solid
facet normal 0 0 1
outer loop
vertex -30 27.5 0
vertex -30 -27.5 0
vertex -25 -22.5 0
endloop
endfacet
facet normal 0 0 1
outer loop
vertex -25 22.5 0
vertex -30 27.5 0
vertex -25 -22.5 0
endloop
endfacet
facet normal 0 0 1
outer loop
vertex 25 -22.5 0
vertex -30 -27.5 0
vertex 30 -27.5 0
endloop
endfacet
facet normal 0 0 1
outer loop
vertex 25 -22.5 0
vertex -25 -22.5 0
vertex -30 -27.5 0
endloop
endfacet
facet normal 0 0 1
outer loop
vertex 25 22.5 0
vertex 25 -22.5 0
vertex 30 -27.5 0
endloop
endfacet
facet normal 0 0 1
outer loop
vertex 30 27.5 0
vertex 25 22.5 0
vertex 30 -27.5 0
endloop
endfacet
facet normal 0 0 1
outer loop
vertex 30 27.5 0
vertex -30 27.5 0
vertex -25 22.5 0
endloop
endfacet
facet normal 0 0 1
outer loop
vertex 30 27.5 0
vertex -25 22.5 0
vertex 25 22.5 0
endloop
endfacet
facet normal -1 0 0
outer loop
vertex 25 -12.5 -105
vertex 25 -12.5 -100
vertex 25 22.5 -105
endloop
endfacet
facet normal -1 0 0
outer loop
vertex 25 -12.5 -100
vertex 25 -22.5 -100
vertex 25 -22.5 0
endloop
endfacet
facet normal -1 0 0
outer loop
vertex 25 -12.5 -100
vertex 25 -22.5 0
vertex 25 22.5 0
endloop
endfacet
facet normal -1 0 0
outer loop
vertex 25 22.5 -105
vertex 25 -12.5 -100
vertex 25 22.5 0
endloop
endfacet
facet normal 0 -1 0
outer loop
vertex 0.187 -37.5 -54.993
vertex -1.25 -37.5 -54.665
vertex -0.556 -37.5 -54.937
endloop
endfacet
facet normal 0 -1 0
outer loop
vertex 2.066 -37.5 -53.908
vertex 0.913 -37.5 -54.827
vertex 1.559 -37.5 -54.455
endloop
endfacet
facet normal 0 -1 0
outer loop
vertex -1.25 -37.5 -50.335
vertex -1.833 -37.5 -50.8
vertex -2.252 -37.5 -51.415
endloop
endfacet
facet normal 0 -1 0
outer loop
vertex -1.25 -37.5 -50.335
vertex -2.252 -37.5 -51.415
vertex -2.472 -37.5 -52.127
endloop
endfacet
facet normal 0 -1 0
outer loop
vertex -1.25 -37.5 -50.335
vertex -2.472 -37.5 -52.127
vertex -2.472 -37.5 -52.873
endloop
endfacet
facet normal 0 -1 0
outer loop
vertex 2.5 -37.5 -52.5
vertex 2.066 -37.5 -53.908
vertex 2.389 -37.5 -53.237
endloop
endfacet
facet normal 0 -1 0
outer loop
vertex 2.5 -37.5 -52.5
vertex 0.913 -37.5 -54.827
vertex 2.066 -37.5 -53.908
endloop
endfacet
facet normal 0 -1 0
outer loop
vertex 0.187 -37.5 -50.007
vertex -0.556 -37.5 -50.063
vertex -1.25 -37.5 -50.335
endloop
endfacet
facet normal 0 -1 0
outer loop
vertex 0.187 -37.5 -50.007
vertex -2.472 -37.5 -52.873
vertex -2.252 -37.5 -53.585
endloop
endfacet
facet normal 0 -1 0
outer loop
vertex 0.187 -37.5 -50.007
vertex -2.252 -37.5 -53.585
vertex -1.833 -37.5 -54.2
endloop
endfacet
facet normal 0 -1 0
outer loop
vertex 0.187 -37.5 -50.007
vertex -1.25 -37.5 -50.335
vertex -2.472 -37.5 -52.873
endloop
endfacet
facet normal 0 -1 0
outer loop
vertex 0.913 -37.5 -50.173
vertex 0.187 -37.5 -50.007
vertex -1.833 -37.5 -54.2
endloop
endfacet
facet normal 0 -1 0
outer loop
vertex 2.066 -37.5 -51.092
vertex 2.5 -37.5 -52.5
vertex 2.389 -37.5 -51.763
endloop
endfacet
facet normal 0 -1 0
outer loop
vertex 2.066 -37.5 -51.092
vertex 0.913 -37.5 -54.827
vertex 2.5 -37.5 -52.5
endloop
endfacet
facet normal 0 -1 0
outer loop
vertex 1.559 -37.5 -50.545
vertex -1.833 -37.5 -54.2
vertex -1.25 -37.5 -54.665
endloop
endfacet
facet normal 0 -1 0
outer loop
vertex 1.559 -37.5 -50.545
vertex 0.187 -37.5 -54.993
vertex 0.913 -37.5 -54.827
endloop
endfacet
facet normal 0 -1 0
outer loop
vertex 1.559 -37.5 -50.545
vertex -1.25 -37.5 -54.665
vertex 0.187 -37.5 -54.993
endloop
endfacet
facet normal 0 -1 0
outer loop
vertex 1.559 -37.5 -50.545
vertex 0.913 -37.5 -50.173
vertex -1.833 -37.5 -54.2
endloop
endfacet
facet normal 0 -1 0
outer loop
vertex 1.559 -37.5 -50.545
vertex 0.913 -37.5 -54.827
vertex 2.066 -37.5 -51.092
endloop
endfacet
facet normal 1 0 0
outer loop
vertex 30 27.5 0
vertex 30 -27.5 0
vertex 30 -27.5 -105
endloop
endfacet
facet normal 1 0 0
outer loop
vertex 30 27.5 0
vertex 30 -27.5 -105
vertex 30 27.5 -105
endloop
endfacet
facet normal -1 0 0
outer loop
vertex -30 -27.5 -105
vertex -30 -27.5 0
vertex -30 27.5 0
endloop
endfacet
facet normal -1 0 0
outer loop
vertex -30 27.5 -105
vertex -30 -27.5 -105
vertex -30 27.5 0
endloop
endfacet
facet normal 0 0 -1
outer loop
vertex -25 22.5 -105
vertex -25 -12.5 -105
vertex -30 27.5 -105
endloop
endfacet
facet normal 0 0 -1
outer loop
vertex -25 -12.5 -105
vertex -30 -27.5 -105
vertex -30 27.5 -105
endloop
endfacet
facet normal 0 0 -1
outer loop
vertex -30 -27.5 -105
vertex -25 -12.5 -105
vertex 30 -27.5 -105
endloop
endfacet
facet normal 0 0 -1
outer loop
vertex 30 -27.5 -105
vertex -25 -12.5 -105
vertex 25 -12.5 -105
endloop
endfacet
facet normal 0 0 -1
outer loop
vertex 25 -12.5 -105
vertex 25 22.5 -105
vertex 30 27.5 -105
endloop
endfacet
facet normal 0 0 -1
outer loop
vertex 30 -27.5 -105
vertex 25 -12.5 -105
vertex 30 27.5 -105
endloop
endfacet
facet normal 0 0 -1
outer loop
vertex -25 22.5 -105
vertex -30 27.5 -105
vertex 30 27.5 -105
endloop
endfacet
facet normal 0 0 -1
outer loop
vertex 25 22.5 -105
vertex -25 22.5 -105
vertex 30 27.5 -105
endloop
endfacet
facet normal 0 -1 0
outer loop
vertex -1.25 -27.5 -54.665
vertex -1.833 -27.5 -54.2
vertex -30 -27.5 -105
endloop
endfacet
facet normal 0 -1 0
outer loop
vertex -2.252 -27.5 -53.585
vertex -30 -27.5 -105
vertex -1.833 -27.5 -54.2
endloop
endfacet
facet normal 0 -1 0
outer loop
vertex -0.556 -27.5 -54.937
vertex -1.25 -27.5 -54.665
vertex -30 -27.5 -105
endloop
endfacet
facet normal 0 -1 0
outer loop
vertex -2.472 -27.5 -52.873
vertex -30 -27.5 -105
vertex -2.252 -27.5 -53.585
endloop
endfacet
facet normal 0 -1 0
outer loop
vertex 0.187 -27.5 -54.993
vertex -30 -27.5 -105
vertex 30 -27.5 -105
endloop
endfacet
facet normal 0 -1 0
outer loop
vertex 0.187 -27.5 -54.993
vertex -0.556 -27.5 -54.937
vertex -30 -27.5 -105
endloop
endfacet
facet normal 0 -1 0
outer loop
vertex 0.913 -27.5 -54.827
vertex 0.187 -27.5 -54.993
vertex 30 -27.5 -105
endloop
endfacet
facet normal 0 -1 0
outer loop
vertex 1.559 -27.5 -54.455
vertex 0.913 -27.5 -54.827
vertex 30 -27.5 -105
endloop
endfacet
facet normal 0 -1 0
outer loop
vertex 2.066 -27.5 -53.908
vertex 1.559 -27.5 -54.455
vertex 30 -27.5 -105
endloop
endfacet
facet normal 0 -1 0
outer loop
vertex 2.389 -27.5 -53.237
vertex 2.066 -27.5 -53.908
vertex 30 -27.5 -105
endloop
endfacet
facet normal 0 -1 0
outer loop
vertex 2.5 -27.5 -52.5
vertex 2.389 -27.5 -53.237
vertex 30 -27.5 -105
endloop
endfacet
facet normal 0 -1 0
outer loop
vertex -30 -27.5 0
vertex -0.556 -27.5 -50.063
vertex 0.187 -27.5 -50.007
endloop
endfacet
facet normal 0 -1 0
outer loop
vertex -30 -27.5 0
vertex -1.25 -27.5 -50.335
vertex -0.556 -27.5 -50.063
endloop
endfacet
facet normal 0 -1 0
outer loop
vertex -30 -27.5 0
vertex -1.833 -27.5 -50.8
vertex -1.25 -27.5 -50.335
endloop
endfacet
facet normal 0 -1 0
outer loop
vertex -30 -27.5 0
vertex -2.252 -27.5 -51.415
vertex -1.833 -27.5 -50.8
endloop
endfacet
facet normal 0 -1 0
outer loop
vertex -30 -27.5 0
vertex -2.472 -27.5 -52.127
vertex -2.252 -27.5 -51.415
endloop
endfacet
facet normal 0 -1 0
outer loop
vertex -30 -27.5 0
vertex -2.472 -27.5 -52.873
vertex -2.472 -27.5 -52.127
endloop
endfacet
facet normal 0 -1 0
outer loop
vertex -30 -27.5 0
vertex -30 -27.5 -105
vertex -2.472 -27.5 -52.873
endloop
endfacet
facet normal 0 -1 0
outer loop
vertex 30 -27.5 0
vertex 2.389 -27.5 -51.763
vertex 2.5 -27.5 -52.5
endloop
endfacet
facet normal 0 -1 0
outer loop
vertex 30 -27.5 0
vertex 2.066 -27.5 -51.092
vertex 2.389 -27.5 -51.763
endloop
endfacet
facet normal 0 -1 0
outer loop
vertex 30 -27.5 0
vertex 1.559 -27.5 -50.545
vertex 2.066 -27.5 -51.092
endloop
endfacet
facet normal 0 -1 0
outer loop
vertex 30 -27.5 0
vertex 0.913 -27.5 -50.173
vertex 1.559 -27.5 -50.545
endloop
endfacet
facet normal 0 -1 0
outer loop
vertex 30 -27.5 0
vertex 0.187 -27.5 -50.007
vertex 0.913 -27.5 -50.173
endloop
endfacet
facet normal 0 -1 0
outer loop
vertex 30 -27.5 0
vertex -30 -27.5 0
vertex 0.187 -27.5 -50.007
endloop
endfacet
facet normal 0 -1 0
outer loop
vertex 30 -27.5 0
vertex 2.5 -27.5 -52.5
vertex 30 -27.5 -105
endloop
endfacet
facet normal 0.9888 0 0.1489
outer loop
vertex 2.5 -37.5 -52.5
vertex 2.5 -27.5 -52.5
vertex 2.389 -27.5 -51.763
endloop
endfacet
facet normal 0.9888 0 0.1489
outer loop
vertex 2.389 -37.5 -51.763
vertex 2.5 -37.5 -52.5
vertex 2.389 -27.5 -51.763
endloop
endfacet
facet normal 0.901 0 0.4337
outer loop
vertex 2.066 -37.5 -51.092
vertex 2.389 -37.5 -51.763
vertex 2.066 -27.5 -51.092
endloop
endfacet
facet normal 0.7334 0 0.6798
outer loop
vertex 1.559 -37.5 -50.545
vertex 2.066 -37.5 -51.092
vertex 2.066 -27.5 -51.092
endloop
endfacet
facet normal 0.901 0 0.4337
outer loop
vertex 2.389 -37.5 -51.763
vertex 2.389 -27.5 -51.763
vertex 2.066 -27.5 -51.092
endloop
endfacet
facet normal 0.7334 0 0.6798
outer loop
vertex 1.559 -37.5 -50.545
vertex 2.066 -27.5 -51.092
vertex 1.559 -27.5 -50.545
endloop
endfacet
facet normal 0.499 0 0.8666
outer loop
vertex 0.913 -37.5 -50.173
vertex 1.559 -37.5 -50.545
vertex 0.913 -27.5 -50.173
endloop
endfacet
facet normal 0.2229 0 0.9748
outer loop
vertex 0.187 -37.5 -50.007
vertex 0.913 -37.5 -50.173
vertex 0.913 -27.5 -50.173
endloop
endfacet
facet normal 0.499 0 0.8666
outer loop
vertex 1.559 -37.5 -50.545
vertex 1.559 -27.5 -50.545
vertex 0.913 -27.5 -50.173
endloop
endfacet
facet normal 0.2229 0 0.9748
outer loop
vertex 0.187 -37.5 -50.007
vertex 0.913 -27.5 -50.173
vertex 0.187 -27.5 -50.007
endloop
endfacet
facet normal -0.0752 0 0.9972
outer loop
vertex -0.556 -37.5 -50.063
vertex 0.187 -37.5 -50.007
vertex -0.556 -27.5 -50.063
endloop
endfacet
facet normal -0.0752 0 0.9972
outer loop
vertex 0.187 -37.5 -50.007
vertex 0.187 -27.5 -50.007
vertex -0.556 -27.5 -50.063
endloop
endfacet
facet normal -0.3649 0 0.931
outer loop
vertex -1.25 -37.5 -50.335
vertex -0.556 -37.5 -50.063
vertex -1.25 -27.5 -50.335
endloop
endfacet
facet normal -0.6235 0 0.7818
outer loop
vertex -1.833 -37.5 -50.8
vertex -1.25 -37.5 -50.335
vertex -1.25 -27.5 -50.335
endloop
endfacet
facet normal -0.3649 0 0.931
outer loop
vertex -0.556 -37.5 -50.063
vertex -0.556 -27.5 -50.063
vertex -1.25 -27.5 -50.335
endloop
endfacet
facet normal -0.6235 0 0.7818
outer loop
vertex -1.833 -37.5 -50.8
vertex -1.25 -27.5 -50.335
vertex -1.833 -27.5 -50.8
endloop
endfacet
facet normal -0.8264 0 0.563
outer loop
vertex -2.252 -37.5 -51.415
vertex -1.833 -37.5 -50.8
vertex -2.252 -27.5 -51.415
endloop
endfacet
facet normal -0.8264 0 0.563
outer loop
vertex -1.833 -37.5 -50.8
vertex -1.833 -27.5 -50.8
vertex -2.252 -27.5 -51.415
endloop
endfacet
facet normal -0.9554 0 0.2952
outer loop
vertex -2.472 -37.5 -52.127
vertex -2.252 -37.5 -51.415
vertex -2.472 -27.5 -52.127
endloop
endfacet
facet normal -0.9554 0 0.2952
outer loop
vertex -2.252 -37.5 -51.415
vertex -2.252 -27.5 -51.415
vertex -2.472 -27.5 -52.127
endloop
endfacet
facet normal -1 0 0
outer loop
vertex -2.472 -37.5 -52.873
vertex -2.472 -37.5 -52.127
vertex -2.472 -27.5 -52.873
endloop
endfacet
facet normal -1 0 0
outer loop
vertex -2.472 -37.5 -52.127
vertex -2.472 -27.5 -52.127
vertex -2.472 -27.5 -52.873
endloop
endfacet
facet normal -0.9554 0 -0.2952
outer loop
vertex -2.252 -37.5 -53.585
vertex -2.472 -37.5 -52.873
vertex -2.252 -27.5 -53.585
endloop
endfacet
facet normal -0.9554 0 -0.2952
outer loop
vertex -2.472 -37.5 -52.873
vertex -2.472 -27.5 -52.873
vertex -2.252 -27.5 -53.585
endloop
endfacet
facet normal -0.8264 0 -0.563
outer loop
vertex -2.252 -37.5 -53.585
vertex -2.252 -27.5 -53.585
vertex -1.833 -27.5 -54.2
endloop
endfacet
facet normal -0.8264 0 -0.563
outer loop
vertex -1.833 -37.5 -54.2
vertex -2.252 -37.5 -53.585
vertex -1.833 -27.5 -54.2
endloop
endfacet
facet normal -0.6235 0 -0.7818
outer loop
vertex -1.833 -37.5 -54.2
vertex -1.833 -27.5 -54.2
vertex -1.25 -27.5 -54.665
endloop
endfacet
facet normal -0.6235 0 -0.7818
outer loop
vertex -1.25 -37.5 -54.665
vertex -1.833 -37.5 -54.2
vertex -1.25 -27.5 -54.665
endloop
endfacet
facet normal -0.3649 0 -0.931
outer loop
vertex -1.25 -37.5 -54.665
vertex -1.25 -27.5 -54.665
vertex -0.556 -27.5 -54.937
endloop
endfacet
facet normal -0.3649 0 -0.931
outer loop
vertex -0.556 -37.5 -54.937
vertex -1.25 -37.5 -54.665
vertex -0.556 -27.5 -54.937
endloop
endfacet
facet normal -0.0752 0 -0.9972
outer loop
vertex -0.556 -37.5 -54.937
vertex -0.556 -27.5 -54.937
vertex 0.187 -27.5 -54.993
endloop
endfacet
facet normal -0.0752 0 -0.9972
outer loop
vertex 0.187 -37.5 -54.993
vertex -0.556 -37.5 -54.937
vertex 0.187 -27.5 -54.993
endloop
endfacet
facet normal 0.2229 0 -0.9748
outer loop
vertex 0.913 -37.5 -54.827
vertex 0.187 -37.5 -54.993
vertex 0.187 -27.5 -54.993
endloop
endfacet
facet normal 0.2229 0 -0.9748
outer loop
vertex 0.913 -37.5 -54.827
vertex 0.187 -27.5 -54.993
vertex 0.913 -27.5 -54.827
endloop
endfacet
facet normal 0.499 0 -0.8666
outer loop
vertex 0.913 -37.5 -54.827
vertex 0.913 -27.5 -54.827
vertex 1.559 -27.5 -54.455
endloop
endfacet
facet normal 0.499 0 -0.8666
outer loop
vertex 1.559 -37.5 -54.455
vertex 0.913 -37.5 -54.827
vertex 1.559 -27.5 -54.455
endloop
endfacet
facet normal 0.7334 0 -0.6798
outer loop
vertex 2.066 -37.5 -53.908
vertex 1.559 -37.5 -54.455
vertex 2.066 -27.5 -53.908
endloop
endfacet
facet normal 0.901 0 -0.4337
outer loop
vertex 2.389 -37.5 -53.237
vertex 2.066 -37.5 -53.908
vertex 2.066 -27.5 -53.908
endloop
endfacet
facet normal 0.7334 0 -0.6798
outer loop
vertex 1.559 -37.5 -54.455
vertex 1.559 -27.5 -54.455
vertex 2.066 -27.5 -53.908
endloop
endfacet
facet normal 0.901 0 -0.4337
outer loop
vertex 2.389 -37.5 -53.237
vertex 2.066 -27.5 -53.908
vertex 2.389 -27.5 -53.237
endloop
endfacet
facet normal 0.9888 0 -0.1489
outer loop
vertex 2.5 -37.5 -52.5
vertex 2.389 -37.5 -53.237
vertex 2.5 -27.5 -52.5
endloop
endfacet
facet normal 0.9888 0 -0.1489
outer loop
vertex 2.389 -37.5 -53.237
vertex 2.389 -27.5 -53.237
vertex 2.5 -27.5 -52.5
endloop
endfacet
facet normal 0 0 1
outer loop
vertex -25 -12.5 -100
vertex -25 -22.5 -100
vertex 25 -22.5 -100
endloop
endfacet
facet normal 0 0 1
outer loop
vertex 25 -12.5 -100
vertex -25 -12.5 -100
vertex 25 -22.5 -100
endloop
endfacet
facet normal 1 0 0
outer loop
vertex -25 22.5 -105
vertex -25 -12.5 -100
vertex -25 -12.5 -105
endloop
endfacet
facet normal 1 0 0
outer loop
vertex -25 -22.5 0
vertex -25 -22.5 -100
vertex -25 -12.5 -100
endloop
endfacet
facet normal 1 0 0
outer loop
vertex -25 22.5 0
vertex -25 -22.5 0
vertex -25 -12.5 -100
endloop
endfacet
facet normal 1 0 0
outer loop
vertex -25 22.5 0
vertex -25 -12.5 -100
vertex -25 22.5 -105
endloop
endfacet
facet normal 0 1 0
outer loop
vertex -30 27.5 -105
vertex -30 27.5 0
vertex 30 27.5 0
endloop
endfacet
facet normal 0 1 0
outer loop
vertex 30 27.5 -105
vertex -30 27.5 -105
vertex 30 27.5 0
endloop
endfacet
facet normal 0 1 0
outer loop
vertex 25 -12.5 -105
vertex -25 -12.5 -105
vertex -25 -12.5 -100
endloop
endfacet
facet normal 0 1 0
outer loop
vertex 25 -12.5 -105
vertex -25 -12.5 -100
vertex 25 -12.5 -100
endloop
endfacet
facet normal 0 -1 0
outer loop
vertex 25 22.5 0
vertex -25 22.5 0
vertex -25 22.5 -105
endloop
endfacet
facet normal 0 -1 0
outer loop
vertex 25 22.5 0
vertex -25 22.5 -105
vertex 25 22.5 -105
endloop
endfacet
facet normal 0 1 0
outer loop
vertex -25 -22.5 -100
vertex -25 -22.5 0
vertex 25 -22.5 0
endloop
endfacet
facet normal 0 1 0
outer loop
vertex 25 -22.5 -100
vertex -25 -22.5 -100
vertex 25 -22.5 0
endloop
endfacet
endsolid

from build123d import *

# Parameters (mm, degrees)
SKETCH3_W           = 60
SKETCH3_H           = 55
SKETCH3_W_2         = 50
SKETCH3_H_2         = 45
BOSS_EXTRUDE1_DEPTH = 105
SKETCH6_W           = 50
SKETCH6_H           = 5
BOSS_EXTRUDE3_DEPTH = 10
SKETCH7_R           = 2.5
BOSS_EXTRUDE4_DEPTH = 10


with BuildPart() as part:
    # Sketch3 → Boss-Extrude1 (new body)
    with BuildSketch(Plane.XY):
        Rectangle(SKETCH3_W, SKETCH3_H)
        Rectangle(SKETCH3_W_2, SKETCH3_H_2, mode=Mode.SUBTRACT)
    extrude(amount=-BOSS_EXTRUDE1_DEPTH)

    # Sketch6 → Boss-Extrude3 (add)
    with BuildSketch(Plane(origin=(0, -22.5, 0), x_dir=(1, 0, 0), z_dir=(0, 1, 0))):
        with Locations((0, 102.5)):
            Rectangle(SKETCH6_W, SKETCH6_H)
    extrude(amount=BOSS_EXTRUDE3_DEPTH)

    # Sketch7 → Boss-Extrude4 (add)
    with BuildSketch(Plane.XZ.offset(27.5)):
        with Locations((0, -52.5)):
            Circle(SKETCH7_R)
    extrude(amount=BOSS_EXTRUDE4_DEPTH)


solid = part.part
